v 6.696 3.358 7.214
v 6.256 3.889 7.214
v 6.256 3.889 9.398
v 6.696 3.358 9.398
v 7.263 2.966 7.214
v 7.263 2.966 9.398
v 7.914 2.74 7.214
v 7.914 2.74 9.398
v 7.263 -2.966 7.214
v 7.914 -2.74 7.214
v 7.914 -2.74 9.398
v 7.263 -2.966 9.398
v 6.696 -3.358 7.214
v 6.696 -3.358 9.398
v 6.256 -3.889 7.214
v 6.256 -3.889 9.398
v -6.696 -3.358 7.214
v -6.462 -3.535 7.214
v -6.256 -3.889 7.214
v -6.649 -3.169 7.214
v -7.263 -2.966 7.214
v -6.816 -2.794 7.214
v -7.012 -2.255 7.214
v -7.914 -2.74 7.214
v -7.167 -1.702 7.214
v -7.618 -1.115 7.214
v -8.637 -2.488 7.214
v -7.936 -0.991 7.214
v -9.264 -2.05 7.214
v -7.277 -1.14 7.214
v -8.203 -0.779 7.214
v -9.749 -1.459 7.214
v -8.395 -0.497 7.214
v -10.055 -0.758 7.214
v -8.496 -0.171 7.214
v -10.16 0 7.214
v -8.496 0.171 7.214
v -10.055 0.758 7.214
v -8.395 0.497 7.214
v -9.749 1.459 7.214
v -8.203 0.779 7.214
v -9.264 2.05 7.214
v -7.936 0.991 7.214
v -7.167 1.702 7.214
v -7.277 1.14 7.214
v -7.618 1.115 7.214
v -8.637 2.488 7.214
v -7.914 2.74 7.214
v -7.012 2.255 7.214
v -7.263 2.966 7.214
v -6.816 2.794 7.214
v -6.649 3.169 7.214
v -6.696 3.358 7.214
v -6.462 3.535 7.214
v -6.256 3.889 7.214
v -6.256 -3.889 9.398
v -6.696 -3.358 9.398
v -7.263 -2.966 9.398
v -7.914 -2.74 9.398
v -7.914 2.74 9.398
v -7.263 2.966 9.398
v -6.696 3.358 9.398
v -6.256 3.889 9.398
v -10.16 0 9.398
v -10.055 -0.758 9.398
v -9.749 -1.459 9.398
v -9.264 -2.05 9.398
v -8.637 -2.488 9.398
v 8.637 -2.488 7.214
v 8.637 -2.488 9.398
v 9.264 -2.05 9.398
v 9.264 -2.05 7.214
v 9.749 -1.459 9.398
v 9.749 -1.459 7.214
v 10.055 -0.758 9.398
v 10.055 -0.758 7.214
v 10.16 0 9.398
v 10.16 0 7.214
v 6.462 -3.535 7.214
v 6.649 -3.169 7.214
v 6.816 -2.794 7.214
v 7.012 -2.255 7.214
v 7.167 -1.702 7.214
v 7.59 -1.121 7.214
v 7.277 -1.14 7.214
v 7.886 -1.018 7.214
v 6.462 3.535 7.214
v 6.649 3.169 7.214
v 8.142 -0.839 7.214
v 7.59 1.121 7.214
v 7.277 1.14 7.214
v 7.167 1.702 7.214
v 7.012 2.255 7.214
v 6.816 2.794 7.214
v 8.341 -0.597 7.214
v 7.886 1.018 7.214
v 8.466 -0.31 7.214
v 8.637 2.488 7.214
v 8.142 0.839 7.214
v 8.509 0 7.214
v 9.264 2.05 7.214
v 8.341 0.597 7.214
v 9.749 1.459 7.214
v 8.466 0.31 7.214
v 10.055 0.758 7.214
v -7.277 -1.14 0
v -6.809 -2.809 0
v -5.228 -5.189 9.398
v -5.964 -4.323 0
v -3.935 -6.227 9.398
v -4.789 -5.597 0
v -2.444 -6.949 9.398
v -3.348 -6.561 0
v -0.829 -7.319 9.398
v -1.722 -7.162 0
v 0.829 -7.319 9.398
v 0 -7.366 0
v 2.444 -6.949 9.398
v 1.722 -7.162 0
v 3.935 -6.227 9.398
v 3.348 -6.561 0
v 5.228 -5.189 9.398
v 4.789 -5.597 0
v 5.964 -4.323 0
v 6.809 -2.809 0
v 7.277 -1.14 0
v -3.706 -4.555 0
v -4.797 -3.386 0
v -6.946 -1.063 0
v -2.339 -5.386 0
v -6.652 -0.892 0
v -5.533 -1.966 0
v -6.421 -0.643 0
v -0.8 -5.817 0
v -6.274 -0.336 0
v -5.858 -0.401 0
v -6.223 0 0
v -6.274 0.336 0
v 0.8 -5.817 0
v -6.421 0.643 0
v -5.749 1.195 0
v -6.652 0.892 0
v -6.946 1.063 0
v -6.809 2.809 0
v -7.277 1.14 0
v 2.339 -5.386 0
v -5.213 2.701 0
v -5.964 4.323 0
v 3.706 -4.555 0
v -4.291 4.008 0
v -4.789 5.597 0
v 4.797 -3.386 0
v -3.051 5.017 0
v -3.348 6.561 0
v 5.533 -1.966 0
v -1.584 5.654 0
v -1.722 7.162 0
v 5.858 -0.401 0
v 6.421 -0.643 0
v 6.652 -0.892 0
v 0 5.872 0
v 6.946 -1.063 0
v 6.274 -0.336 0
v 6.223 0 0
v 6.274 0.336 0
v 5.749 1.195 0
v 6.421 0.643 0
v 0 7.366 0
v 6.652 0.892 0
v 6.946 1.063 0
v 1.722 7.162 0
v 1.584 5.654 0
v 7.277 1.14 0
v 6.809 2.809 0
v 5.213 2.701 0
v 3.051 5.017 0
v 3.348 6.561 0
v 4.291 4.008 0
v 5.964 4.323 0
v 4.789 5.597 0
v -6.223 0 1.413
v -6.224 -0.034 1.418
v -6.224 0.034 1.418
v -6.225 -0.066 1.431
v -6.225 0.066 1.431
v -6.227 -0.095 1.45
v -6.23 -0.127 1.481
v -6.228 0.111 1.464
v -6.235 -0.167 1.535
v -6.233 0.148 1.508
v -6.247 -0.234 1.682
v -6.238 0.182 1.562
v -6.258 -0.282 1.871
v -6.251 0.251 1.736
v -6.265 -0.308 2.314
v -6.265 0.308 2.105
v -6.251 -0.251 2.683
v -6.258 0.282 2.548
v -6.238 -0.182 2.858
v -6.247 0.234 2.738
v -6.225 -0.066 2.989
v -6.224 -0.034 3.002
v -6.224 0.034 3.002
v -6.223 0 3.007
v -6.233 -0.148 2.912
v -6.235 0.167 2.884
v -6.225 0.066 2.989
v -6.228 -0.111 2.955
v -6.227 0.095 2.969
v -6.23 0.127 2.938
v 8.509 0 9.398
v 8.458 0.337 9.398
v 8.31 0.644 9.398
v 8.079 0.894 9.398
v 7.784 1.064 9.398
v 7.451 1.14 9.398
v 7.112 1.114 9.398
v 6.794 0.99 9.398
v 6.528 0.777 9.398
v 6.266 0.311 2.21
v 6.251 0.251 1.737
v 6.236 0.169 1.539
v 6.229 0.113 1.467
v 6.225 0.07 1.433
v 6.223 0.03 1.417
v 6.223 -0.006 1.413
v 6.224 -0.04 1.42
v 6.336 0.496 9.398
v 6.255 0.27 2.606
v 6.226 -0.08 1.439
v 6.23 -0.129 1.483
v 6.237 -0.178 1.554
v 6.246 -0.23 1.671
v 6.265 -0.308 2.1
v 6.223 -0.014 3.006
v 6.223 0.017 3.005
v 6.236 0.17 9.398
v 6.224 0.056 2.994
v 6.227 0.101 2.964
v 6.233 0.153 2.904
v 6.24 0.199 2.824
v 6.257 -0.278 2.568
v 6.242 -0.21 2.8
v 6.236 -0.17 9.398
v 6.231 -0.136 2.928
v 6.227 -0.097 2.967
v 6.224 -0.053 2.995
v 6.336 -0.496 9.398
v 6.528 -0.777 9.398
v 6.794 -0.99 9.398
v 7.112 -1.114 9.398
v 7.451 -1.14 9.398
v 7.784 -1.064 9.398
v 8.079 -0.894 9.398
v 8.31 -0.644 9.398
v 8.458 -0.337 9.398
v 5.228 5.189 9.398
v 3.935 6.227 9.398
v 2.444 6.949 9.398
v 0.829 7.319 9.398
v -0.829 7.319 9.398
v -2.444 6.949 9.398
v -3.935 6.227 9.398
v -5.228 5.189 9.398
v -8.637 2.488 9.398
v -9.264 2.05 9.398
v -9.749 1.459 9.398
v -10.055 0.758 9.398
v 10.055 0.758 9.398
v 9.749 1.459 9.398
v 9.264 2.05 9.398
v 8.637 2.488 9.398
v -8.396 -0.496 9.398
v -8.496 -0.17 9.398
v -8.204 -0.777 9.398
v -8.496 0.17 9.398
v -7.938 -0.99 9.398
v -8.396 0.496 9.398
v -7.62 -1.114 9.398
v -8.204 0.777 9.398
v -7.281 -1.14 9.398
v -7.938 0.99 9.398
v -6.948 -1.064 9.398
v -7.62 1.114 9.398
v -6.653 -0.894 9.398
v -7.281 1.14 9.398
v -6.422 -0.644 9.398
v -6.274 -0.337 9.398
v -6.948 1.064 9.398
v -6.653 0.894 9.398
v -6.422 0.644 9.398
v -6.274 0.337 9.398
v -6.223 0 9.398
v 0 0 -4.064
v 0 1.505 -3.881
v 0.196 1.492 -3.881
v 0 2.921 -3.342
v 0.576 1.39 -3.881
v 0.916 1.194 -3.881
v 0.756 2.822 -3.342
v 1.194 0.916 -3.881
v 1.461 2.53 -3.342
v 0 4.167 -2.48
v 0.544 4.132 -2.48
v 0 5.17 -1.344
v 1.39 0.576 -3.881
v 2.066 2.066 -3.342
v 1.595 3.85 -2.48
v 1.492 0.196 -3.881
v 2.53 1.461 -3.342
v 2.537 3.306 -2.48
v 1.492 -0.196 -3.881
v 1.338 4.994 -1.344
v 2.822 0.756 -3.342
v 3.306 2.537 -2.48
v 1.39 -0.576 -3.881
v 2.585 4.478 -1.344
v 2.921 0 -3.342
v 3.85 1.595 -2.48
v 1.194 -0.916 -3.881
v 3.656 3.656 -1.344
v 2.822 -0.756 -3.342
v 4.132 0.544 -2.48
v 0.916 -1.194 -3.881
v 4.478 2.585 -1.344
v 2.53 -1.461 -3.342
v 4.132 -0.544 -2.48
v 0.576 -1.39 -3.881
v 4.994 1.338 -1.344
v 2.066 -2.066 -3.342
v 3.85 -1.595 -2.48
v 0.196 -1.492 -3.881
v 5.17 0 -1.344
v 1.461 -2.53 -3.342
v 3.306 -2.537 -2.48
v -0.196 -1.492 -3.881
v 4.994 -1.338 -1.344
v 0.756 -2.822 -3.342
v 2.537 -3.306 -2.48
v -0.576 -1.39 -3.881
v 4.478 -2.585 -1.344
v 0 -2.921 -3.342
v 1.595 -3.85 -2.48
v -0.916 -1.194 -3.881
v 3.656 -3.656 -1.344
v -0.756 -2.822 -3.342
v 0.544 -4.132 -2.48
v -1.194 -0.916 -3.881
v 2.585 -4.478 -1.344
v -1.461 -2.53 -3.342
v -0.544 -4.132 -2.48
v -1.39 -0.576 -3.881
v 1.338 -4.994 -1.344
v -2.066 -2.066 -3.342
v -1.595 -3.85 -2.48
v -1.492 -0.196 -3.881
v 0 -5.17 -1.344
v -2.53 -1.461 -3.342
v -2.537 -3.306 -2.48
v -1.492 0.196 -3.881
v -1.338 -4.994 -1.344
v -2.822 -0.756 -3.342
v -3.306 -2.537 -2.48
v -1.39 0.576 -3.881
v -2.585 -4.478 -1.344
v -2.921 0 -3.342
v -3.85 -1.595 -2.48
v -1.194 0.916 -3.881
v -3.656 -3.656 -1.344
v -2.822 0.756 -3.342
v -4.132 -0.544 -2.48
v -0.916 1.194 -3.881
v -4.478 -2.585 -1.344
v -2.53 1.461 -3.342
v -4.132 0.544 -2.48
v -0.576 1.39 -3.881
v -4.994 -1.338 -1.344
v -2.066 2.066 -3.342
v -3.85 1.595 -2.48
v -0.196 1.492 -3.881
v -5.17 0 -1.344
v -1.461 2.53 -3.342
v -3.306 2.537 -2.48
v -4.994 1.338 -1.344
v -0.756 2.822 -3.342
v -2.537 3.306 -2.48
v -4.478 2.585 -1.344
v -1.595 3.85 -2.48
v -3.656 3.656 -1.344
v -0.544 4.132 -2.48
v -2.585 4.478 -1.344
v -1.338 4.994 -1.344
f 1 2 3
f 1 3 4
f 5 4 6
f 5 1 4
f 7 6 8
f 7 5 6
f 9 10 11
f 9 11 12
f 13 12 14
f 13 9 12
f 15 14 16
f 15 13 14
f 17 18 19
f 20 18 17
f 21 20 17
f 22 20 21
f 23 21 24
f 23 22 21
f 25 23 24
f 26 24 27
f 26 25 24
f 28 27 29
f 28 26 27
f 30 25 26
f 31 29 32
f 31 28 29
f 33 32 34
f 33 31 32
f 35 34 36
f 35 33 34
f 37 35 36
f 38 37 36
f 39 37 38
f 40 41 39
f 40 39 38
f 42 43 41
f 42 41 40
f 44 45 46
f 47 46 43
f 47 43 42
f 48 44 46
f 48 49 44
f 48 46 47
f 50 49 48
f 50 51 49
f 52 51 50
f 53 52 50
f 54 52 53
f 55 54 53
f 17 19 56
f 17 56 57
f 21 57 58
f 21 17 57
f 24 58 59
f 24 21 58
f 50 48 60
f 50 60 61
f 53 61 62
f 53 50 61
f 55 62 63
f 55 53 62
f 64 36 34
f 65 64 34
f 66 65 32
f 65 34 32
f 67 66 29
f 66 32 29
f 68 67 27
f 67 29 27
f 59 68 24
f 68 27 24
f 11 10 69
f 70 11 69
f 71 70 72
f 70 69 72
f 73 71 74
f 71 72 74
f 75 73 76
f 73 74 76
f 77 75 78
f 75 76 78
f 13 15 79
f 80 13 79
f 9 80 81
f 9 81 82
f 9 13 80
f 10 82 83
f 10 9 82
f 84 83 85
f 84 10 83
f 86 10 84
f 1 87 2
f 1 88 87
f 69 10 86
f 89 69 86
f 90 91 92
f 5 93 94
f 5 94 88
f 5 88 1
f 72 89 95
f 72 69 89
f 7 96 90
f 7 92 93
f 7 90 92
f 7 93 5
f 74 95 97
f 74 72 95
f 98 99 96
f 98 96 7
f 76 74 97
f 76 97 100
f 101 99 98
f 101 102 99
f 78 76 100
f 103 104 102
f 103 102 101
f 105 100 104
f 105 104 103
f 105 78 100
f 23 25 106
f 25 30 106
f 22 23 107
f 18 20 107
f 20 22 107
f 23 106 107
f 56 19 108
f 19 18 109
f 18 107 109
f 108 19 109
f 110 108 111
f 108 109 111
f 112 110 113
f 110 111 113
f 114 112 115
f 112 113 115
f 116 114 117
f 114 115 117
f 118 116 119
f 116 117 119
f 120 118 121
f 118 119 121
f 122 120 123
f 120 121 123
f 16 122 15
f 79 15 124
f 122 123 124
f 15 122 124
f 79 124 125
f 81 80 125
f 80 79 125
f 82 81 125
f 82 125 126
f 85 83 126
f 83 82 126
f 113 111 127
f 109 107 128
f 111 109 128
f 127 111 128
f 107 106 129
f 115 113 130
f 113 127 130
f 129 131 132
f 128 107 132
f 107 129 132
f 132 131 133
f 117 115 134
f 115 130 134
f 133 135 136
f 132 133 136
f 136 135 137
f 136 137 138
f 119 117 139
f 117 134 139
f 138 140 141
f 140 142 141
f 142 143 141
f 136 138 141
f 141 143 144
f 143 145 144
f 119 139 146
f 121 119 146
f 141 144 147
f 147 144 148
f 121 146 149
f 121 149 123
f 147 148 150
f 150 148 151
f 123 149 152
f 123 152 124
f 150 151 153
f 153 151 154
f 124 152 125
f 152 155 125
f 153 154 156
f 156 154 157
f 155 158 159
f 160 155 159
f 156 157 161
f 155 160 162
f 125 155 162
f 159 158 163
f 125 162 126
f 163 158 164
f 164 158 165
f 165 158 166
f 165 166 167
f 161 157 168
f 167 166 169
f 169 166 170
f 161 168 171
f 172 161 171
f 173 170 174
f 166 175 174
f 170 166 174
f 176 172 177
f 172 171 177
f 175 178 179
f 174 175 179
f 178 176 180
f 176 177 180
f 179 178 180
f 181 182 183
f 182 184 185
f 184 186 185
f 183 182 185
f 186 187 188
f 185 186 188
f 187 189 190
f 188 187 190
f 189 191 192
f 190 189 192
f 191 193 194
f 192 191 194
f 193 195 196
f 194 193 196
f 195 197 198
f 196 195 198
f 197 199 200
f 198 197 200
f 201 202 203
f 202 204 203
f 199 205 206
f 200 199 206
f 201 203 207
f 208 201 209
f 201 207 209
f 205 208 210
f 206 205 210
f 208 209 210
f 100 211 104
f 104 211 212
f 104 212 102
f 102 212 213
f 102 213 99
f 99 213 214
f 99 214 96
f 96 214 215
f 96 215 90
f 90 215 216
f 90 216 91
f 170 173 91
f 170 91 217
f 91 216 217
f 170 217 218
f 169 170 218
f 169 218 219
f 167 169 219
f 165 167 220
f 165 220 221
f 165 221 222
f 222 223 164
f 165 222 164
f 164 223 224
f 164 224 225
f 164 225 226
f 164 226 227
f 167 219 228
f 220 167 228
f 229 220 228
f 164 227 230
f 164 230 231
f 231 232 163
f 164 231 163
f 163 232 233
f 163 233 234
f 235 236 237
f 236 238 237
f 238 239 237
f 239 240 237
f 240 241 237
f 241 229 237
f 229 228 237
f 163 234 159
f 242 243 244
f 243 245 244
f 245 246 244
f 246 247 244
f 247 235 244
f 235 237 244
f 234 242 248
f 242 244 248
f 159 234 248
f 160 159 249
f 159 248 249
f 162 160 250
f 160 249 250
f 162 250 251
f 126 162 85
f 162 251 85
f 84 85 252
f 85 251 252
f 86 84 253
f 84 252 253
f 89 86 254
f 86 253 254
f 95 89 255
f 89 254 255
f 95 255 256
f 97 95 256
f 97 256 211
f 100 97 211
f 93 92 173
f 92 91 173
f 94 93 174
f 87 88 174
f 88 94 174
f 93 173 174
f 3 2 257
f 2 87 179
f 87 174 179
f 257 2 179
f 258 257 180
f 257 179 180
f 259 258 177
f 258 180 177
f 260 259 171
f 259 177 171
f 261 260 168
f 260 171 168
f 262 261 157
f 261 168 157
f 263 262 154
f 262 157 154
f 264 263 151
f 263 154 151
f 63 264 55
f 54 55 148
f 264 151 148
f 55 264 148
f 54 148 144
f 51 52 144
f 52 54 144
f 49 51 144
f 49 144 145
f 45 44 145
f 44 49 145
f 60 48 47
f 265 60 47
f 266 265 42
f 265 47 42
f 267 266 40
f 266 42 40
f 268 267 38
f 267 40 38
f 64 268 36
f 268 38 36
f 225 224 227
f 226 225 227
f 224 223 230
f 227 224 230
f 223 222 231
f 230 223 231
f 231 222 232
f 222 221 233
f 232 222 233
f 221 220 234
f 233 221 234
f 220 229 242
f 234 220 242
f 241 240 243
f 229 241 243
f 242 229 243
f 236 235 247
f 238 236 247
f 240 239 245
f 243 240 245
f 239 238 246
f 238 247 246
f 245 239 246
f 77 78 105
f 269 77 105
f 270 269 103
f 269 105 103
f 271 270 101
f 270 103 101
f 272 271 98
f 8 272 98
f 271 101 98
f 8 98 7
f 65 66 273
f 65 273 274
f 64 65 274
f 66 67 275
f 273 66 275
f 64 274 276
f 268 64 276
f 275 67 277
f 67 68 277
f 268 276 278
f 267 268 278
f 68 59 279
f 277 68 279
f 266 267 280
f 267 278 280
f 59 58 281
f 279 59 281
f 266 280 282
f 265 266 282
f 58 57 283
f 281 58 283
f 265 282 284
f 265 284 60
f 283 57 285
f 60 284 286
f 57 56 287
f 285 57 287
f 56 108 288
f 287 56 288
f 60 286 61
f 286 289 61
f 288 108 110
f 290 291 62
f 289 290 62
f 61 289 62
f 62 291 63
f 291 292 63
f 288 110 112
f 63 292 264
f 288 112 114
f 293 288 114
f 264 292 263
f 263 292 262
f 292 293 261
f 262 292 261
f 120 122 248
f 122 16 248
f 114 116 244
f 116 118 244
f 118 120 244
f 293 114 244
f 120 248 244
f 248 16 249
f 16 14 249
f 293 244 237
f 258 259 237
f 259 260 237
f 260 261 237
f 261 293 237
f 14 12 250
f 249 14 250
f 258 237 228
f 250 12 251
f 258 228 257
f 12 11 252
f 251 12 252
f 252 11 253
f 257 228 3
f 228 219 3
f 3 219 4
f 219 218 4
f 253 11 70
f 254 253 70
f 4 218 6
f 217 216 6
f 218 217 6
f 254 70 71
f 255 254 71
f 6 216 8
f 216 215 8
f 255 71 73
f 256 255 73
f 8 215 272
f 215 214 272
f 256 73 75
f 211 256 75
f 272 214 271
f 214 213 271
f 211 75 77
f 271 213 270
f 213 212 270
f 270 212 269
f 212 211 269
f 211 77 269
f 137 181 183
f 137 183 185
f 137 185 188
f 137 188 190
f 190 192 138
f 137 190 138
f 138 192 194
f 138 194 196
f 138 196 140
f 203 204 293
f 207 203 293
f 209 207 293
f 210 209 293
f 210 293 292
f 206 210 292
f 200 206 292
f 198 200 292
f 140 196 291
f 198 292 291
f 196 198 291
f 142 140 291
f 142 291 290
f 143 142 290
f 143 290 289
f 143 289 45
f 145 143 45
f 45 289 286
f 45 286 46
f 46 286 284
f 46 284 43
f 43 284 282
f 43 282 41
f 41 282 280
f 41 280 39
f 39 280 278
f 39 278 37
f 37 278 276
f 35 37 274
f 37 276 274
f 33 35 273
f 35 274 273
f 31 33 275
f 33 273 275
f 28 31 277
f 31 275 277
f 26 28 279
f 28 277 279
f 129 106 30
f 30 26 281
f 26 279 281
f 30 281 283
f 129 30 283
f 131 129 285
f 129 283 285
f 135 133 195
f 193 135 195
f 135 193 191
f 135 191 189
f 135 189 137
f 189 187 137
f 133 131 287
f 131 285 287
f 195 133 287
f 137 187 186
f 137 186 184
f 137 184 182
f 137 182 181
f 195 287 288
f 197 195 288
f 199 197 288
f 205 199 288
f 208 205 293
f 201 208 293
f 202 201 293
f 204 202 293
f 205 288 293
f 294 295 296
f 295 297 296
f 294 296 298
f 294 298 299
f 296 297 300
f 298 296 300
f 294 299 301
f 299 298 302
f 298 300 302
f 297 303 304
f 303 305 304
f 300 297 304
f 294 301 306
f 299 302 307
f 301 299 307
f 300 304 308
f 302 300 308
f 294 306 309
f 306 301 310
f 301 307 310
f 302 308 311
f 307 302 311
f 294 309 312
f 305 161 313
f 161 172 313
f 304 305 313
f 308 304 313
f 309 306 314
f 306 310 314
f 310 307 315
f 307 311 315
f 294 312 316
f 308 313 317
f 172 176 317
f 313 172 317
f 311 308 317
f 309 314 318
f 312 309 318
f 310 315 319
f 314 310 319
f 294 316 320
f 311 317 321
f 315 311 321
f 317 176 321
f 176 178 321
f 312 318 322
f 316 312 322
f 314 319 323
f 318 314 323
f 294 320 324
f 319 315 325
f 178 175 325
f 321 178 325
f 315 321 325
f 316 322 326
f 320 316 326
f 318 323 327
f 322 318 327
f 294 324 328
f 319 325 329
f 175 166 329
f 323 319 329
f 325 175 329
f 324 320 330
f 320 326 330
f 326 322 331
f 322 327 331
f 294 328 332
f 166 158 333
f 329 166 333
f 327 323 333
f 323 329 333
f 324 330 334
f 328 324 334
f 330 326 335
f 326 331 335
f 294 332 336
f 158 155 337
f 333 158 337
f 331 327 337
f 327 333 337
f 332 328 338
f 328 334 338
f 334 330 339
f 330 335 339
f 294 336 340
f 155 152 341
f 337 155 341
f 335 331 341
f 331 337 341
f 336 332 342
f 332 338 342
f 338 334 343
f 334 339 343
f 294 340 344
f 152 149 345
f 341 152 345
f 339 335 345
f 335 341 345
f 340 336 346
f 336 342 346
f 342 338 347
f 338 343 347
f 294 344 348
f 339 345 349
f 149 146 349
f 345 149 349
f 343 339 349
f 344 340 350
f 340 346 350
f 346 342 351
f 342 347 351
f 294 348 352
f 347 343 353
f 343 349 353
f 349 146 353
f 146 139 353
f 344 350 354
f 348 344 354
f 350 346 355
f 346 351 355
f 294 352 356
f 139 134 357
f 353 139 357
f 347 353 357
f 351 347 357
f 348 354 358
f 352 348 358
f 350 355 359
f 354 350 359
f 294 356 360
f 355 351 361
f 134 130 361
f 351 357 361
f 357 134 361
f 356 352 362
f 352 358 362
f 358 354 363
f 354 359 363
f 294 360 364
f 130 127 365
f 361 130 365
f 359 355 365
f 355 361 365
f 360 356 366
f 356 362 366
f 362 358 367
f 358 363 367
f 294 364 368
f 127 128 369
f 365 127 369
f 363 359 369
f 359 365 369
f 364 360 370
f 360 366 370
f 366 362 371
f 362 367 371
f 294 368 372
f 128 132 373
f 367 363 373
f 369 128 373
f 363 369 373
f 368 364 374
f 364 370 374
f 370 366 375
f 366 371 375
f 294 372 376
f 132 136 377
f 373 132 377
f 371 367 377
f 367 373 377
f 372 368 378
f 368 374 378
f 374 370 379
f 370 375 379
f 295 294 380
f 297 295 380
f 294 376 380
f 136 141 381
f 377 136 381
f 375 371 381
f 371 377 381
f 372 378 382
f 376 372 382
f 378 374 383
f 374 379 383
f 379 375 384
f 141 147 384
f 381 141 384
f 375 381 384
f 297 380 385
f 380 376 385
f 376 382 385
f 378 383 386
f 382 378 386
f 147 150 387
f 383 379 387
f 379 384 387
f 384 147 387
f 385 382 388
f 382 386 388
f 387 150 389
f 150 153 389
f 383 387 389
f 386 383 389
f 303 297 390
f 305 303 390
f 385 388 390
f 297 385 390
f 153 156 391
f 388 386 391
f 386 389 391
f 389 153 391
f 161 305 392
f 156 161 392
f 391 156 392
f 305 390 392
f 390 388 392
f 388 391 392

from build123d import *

# Parameters (mm, degrees)
ESQUISSE1_R             = 7.366
BOSS_EXTRU_1_DEPTH      = 9.398
BOSS_EXTRU_2_START      = -2.1844
BOSS_EXTRU_2_DEPTH      = 2.1844
CONG_1_R                = 2.54
ESQUISSE3_R             = 1.143
ENL_V_MAT_EXTRU_2_DEPTH = 16.678200152


with BuildPart() as part:
    # Esquisse1 → Boss.-Extru.1 (new body)
    with BuildSketch(Plane.XY):
        Circle(ESQUISSE1_R)
    extrude(amount=BOSS_EXTRU_1_DEPTH)

    # Esquisse2 → Boss.-Extru.2 (add)
    with BuildSketch(Plane.XY.offset(9.398).offset(BOSS_EXTRU_2_START)):
        with BuildLine():
            Line((7.366, 2.794), (6.815535195, 2.794))
            ThreePointArc((6.815535195, 2.794), (7.22707369, 1.423854584), (7.366, 0))
            Line((7.366, 0), (10.16, 0))
            ThreePointArc((10.16, 0), (9.341656347, 1.975656347), (7.366, 2.794))
        make_face()
        with BuildLine():
            Line((10.16, 0), (7.366, 0))
            ThreePointArc((7.366, 0), (7.22707369, -1.423854584), (6.815535195, -2.794))
            Line((6.815535195, -2.794), (7.366, -2.794))
            ThreePointArc((7.366, -2.794), (9.341656347, -1.975656347), (10.16, 0))
        make_face()
        with BuildLine():
            Line((-7.366, 0), (-10.16, 0))
            ThreePointArc((-10.16, 0), (-9.341656347, -1.975656347), (-7.366, -2.794))
            Line((-7.366, -2.794), (-6.815535195, -2.794))
            ThreePointArc((-6.815535195, -2.794), (-7.22707369, -1.423854584), (-7.366, 0))
        make_face()
        with BuildLine():
            Line((-6.815535195, 2.794), (-7.366, 2.794))
            ThreePointArc((-7.366, 2.794), (-9.341656347, 1.975656347), (-10.16, 0))
            Line((-10.16, 0), (-7.366, 0))
            ThreePointArc((-7.366, 0), (-7.22707369, 1.423854584), (-6.815535195, 2.794))
        make_face()
    extrude(amount=BOSS_EXTRU_2_DEPTH)

    # Congé1
    # the kernel refuses this fillet: 2.54 mm, written as the material it adds along each edge
    with BuildSketch(Plane(origin=(6.815535195, 2.794, 7.2136), x_dir=(-0.45524151464262924, 0.8903679932173465, 0), z_dir=(0, 0, 1)), Plane(origin=(-6.815535195, -2.794, 7.2136), x_dir=(0.4552415146426176, -0.8903679932173524, 0), z_dir=(0, 0, 1))) as cong_1_piece_1:
        with BuildLine():
            CenterArc((1.442130851, -2.531130754), CONG_1_R, 94.789504406, 46.813825589)
            Line((-0.548542223, -0.953531086), (-0.74760953, -0.795771119))
            ThreePointArc((-0.74760953, -0.795771119), (-0.476747902, -0.374484899), (-0.22615347, 0.115631345))
            Line((-0.22615347, 0.115631345), (0.021207807, 0.253113075))
            ThreePointArc((0.021207807, 0.253113075), (0.615026392, 0.228279187), (1.208844978, 0.253113075))
            Line((1.208844978, 0.253113075), (1.230052785, 0))
        make_face()
    extrude(amount=2.1844)
    with BuildSketch(Plane(origin=(6.815535195, -2.794, 7.2136), x_dir=(-0.4552415146426287, -0.8903679932173468, 0), z_dir=(0, 0, 1)), Plane(origin=(-6.815535195, 2.794, 7.2136), x_dir=(0.45524151464261825, 0.890367993217352, 0), z_dir=(0, 0, 1))) as cong_1_piece_2:
        with BuildLine():
            CenterArc((1.442130851, 2.531130754), CONG_1_R, 218.396670004, 46.813825589)
            Line((-0.548542223, 0.953531086), (-0.74760953, 0.795771119))
            ThreePointArc((-0.74760953, 0.795771119), (-0.476747902, 0.374484899), (-0.22615347, -0.115631345))
            Line((-0.22615347, -0.115631345), (0.021207807, -0.253113075))
            ThreePointArc((0.021207807, -0.253113075), (0.615026392, -0.228279187), (1.208844978, -0.253113075))
            Line((1.208844978, -0.253113075), (1.230052785, 0))
        make_face()
    extrude(amount=2.1844)

    # Esquisse3 → Enlèv. mat.-Extru.2 (cut, through all)
    with BuildSketch(Plane.XY.offset(9.398)):
        with Locations((-7.366, 0)):
            Circle(ESQUISSE3_R)
        with Locations((7.366, 0)):
            Circle(ESQUISSE3_R)
    extrude(amount=-ENL_V_MAT_EXTRU_2_DEPTH, mode=Mode.SUBTRACT)

    # Esquisse4 → Révolution4 (revolve)
    with BuildSketch(Plane(origin=(0, 0, 0), x_dir=(0, 0, -1), z_dir=(1, 0, 0))):
        with BuildLine():
            Line((-8.4836, 0), (4.064, 0))
            ThreePointArc((4.064, 0), (-2.2098, 6.2738), (-8.4836, 0))
        make_face()
    revolve(axis=Axis((0, 0, 7.037287666), (0, 0, -1)))


solid = part.part
